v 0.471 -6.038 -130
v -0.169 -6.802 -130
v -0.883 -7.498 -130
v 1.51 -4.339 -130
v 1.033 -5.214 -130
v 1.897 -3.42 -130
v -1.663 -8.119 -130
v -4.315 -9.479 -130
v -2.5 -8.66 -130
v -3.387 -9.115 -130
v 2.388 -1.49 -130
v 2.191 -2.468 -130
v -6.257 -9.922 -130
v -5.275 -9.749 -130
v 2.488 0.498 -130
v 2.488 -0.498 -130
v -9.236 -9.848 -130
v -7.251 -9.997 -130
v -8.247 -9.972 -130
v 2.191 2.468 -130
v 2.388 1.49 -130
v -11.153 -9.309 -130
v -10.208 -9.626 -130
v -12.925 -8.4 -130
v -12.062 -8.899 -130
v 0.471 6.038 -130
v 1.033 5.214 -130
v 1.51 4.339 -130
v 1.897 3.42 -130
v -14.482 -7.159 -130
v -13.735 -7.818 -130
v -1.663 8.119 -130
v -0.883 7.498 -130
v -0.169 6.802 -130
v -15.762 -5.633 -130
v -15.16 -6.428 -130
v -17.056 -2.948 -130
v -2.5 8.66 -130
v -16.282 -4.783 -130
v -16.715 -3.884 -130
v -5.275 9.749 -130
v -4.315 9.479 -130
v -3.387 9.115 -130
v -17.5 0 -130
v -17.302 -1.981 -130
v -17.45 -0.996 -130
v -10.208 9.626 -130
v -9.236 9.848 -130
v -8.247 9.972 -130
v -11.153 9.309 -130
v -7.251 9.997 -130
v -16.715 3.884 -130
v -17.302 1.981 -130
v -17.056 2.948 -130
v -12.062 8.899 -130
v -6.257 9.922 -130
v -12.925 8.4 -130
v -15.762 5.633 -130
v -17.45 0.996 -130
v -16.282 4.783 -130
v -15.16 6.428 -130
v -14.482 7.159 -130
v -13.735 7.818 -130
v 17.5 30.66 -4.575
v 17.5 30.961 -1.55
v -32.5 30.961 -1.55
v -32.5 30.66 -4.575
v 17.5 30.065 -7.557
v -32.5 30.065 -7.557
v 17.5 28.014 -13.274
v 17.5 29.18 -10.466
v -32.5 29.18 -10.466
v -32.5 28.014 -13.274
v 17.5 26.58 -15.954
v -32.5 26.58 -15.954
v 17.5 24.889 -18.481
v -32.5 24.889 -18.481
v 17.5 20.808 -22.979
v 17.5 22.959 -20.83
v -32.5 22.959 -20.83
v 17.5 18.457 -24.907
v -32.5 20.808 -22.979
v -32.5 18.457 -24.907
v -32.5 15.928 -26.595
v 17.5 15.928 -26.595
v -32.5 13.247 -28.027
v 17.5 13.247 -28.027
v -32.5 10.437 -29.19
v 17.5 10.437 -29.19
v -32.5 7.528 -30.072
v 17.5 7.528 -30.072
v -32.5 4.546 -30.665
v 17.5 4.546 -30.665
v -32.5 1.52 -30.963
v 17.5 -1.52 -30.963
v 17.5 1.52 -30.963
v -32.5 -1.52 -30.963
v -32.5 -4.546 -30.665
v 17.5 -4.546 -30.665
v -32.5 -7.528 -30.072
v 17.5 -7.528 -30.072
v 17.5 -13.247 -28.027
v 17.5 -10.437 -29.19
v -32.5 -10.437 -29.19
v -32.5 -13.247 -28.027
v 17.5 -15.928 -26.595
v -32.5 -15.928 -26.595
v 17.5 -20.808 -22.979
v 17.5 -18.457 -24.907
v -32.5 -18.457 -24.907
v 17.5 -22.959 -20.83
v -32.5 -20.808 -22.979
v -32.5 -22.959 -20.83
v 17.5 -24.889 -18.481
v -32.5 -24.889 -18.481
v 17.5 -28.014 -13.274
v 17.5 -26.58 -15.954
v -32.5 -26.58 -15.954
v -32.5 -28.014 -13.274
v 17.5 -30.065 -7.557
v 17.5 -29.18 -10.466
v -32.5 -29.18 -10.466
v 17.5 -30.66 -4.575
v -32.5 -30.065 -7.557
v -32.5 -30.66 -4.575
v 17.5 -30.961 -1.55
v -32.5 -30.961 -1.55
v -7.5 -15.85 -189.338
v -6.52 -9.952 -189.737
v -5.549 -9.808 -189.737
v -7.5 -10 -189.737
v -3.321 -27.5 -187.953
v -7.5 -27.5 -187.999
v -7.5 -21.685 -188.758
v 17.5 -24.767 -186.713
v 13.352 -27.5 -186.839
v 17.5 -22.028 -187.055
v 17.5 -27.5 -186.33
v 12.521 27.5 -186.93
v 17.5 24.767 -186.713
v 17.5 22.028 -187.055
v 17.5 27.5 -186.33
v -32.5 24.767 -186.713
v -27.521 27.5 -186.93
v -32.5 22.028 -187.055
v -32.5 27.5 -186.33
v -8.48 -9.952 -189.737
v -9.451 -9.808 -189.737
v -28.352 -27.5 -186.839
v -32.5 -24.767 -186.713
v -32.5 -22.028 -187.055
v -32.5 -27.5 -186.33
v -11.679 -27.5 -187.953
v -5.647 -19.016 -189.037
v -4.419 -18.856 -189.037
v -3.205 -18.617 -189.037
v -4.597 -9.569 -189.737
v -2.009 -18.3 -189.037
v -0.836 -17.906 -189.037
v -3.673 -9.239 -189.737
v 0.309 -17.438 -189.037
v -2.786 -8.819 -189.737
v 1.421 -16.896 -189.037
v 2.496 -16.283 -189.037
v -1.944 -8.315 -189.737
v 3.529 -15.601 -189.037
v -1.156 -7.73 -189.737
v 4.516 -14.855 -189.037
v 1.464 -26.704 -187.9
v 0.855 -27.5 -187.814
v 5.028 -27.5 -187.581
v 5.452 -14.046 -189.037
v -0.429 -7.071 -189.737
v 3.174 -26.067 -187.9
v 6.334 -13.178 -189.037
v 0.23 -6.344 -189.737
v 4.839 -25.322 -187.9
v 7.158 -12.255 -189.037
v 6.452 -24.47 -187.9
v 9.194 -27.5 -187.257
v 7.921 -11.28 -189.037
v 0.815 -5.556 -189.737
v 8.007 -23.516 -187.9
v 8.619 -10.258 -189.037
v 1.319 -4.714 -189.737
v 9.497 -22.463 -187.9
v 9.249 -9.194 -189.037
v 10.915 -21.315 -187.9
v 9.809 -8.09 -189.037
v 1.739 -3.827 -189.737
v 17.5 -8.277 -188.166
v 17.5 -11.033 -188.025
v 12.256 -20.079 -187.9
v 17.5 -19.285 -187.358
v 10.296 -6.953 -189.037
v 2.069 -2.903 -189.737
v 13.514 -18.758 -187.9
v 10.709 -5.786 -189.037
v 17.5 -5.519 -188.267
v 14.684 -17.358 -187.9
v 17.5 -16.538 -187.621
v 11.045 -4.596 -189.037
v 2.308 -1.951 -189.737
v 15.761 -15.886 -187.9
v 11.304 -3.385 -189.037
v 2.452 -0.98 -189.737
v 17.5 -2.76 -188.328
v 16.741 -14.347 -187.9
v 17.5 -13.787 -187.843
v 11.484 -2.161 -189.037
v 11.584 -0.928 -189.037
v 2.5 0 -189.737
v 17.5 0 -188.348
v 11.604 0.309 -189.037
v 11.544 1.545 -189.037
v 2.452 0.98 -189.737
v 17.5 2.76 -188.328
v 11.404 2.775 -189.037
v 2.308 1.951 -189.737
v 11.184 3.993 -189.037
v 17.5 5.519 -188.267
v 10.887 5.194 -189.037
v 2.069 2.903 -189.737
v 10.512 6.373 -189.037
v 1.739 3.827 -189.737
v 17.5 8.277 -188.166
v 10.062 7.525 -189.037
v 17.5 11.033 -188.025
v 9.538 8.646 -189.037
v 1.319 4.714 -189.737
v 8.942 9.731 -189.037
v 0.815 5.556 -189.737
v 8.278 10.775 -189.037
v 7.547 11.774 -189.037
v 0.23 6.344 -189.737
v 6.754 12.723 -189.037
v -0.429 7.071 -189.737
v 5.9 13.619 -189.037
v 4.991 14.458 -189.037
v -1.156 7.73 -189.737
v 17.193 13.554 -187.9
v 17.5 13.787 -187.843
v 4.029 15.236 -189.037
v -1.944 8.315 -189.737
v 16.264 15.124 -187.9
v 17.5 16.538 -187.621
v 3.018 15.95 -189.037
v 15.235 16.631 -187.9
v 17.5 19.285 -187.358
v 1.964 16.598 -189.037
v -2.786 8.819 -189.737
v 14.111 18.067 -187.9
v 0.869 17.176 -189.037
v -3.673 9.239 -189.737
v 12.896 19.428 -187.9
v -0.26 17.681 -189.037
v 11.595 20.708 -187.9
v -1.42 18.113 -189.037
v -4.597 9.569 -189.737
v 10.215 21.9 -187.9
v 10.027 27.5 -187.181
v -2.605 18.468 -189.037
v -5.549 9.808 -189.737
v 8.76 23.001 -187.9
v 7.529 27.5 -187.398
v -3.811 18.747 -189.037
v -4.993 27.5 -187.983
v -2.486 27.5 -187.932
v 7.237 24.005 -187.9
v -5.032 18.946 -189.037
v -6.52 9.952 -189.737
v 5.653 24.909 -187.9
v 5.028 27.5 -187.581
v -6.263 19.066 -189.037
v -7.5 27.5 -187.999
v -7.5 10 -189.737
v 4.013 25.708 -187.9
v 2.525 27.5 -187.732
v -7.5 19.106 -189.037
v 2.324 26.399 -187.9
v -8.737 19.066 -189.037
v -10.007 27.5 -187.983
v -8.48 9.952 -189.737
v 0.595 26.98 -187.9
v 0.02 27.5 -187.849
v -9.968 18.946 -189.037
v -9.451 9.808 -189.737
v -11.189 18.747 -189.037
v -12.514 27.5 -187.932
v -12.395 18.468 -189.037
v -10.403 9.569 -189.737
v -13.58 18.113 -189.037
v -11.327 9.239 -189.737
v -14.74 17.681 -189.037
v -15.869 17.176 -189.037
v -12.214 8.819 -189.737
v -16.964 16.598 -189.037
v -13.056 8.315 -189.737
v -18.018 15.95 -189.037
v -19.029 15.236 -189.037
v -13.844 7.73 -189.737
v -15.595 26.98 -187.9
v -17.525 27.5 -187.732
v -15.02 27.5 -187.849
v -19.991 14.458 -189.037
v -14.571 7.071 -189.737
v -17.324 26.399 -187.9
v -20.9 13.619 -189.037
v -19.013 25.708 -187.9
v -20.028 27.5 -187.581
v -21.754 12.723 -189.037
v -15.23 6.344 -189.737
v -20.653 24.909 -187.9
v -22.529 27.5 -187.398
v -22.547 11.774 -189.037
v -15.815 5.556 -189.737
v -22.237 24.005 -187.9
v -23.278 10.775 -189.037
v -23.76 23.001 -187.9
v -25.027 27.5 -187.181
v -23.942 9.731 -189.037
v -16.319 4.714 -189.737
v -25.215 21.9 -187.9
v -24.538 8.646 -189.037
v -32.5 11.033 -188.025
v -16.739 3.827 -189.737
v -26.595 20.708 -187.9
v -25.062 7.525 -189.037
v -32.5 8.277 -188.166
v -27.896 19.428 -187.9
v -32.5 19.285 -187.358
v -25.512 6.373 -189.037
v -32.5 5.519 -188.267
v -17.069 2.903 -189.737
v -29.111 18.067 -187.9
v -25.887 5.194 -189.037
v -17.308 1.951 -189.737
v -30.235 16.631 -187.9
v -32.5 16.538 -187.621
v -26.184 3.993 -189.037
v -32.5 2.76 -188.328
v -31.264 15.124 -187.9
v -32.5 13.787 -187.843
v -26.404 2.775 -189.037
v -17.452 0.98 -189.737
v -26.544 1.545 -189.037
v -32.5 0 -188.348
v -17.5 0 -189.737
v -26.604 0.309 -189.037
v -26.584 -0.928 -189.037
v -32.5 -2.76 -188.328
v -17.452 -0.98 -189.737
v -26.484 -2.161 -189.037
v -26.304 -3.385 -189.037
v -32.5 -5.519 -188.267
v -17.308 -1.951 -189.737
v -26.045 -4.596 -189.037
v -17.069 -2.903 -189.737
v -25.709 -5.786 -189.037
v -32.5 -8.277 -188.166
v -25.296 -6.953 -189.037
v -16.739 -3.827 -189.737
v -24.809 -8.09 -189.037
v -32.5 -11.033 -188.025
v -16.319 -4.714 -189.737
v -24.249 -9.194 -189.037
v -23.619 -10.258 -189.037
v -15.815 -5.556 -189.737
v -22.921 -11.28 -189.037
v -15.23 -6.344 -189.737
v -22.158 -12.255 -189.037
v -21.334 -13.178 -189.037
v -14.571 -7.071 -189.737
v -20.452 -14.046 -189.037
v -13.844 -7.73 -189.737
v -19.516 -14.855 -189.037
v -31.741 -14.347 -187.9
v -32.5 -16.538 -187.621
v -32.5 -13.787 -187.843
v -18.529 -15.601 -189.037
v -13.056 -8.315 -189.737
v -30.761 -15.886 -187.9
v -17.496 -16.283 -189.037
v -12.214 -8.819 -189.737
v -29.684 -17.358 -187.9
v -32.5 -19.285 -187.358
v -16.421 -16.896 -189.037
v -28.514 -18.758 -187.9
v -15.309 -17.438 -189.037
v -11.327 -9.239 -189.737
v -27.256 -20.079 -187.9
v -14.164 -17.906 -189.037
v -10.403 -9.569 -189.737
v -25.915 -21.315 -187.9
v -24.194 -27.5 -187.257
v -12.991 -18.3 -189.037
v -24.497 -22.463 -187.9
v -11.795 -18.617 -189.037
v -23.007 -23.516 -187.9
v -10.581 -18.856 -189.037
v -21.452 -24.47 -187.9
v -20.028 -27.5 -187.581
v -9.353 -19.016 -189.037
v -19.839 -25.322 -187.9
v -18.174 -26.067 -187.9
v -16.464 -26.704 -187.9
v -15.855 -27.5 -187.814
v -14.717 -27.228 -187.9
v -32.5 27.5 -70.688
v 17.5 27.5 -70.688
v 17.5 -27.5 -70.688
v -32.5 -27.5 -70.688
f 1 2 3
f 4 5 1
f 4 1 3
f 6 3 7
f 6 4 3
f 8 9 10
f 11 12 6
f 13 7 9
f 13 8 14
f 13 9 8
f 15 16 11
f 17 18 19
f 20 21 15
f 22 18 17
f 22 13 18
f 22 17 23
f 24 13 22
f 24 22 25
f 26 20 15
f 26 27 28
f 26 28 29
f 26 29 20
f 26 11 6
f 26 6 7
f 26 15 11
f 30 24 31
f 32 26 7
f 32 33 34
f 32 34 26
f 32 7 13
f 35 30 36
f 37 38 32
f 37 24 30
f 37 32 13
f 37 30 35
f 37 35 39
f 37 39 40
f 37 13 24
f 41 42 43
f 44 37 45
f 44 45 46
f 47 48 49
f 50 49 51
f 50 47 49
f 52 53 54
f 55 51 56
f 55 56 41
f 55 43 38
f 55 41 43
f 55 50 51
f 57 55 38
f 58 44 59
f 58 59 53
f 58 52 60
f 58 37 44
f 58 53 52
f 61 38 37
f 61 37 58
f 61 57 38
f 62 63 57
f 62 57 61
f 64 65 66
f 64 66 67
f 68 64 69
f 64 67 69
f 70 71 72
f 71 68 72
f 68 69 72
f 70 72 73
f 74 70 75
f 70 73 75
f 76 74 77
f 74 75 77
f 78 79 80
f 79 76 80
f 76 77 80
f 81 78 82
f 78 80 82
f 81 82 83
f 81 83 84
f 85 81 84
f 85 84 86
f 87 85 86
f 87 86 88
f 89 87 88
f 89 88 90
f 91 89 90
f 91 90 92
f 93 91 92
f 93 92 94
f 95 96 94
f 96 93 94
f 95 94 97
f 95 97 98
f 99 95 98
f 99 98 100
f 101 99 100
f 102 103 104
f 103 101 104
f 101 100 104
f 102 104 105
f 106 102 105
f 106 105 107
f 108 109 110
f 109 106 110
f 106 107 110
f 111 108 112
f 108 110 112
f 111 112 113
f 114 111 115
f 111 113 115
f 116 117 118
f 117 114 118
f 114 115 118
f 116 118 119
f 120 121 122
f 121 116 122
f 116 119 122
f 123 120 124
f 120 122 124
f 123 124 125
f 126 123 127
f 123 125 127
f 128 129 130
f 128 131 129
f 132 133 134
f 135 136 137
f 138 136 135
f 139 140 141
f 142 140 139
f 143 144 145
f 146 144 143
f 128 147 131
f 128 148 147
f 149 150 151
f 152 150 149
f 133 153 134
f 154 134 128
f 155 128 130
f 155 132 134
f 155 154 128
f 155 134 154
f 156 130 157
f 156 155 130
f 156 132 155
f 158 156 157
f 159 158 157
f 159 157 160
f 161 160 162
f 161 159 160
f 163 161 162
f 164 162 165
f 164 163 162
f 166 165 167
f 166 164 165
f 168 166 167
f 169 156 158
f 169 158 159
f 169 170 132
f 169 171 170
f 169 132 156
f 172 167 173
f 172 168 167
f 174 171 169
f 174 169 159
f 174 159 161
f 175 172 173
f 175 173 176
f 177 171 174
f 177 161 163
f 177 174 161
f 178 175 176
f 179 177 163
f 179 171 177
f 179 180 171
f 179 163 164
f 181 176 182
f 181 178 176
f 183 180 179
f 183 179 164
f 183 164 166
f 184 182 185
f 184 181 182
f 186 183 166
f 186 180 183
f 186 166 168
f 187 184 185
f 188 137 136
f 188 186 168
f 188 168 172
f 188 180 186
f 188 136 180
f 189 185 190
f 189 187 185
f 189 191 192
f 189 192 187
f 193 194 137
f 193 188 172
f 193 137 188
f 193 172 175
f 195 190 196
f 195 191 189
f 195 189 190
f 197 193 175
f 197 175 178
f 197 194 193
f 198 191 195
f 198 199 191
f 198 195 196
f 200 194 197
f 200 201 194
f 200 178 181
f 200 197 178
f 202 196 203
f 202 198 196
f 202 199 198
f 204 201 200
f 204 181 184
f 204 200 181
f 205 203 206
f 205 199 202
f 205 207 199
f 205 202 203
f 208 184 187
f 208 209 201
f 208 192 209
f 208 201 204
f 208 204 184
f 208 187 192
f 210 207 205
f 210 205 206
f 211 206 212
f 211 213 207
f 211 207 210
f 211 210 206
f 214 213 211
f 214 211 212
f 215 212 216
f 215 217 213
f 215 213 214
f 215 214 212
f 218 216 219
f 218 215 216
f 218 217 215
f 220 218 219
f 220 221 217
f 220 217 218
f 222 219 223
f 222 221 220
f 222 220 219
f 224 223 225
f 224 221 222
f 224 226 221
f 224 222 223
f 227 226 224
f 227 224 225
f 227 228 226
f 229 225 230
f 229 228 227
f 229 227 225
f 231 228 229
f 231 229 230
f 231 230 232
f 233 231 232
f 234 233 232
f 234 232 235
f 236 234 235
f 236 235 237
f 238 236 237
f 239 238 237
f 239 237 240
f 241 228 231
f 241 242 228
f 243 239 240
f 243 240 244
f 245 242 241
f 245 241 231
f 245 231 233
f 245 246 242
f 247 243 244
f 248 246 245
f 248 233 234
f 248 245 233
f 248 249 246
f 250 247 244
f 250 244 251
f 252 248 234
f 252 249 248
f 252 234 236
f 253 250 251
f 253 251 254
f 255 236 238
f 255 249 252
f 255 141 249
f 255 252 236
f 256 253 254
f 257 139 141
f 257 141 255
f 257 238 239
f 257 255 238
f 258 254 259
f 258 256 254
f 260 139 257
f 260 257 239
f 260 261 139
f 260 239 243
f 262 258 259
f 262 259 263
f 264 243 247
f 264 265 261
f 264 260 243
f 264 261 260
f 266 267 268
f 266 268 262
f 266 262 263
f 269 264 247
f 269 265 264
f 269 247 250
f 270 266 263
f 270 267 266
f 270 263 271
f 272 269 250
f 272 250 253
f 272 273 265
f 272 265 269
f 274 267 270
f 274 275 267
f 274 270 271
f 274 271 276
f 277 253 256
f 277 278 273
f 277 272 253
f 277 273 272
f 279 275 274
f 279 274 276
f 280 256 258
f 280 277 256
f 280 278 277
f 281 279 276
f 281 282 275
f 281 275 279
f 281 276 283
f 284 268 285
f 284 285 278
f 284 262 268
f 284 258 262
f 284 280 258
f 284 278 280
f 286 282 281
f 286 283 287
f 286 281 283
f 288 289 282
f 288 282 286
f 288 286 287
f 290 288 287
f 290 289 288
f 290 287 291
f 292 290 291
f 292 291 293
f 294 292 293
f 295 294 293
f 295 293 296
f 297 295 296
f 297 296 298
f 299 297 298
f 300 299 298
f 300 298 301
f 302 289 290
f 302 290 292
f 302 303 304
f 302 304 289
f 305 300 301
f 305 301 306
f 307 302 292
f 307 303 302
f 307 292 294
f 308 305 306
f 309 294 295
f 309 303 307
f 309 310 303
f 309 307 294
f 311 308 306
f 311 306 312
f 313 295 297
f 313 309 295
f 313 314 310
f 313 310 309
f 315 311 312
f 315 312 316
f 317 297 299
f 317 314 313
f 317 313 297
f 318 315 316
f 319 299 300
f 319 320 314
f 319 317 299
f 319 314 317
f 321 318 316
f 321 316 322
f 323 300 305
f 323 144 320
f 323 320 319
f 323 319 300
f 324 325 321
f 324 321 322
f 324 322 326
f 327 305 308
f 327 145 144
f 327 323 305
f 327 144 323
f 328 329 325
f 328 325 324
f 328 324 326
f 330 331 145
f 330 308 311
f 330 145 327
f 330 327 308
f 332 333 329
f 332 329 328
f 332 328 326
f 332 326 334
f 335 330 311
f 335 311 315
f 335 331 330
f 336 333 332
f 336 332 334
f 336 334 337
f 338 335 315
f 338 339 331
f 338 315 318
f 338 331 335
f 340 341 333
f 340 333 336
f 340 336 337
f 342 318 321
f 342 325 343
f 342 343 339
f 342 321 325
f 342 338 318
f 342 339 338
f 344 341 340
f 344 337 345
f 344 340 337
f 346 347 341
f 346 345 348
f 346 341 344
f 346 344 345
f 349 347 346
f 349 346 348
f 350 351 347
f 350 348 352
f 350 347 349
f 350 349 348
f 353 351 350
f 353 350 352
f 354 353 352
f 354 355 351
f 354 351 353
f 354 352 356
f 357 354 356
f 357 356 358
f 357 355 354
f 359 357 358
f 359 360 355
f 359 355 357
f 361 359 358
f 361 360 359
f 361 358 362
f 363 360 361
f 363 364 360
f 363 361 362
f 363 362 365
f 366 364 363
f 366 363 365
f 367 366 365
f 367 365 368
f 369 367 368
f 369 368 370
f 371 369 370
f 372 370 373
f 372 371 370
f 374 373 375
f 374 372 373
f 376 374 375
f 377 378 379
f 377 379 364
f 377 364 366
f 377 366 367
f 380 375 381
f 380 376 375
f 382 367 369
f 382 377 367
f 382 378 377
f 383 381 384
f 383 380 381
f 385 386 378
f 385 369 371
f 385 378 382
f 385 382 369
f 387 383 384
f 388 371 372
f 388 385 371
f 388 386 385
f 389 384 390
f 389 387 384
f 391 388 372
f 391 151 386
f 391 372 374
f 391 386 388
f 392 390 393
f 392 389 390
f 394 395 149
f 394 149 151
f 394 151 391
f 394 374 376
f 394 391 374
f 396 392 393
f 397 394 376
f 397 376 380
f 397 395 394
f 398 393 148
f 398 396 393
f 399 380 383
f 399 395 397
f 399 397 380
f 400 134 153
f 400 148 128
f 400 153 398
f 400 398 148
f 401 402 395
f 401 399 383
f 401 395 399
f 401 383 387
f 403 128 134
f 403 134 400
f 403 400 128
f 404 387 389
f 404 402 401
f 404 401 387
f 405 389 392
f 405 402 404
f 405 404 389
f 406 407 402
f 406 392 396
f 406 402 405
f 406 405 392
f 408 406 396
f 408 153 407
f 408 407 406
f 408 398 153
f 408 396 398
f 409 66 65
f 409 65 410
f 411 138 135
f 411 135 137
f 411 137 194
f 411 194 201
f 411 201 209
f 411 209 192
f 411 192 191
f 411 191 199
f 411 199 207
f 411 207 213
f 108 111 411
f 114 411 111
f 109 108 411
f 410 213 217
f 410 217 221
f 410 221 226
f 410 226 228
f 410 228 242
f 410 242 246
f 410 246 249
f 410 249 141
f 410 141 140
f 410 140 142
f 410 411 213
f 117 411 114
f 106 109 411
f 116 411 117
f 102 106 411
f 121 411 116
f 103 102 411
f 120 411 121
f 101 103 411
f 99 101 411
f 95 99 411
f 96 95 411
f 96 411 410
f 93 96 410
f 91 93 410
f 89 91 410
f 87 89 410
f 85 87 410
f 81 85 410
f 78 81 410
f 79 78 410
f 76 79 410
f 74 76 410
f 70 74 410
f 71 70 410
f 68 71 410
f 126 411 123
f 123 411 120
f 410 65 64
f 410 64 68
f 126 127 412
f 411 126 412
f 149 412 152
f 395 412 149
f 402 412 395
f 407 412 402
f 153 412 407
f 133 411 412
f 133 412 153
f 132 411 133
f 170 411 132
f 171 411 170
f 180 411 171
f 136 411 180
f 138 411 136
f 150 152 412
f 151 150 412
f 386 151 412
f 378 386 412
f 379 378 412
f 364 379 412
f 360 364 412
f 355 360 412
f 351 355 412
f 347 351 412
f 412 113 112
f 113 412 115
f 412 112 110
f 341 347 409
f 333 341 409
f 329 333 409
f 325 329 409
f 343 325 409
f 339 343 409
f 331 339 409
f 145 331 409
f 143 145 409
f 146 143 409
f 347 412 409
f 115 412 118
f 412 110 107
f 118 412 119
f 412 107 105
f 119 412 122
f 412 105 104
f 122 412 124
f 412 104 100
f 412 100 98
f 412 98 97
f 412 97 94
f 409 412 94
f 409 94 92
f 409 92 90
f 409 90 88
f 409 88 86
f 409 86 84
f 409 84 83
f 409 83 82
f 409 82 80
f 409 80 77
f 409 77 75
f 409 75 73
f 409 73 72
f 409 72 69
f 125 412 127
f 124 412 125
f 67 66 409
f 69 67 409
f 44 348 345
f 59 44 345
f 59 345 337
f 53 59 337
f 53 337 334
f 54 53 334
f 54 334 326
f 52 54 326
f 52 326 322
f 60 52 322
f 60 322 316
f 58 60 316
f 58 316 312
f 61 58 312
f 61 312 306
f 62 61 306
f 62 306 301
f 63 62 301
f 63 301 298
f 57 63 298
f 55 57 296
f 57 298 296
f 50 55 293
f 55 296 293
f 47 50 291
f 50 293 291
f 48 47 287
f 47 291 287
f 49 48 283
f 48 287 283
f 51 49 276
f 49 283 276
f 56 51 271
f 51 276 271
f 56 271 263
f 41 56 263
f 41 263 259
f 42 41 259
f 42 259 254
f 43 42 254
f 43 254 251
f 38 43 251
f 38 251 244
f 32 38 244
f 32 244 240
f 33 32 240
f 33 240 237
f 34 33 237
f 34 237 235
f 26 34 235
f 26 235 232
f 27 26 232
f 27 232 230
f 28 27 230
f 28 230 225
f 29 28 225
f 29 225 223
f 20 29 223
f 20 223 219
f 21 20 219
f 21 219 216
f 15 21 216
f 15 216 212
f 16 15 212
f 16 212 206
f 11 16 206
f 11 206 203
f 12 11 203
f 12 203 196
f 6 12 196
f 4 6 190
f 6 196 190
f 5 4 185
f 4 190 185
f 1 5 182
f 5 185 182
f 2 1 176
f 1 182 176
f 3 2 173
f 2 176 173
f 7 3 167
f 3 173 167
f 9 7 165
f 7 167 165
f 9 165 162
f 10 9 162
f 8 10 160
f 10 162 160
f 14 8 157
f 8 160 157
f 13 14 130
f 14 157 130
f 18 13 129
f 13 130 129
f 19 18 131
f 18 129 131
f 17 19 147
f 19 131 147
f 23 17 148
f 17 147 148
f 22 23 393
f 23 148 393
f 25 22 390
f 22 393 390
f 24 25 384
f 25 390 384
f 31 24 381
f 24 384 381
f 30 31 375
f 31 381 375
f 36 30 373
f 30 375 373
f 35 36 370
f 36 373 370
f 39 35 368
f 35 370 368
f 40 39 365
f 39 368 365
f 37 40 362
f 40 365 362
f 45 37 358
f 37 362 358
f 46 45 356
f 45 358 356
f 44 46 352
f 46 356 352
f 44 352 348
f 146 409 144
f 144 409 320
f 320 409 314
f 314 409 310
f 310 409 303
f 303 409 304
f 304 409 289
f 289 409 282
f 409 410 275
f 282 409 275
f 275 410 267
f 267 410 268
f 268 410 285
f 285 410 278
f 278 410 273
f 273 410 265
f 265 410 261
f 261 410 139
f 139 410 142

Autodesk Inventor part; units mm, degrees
ref_plane "YZ Plane" through (0, 0, 0) normal (1, 0, 0) x (0, 1, 0)
ref_plane "XY Plane" through (0, 0, 0) normal (0, 0, 1) x (1, 0, 0)
ref_plane "UCS1: YZ Plane" through (0, 0, 0) normal (1, 0, 0) x (0, 1, 0)
sketch "Sketch2" plane through (0, 0, 0) normal (1, 0, 0) x (0, 1, 0)
  circle A0 centre (0, -70) radius 27.5
  line L0 (27.5, -190) -> (-27.5, -190)
  line L1 (0, -70) -> (0, -190) construction
  line L2 (-27.5, -70) -> (-27.5, -190)
  line L3 (27.5, -70) -> (27.5, -190)
  circle A1 centre (0, 0) radius 31
  line L4 (-30.9612, -1.55) -> (-27.4656, -71.375)
  line L5 (30.9612, -1.55) -> (27.4656, -71.375)
  line L6 (31.0388, 0) -> (-31.0388, 0)
  point P0 (-31, 0)
  point P1 (31, 0)
  point P2 (-31, 0)
  point P3 (-27.5, -70.6879)
  point P4 (27.5, -70.6879)
  dimension "d1" = 55
  dimension "d3" = 55
  dimension "d25" = 120
  dimension "d26" = 62
  dimension "d33" = 70
extrude "Extrusion1" add sketch "Sketch2" along normal blind 17.5 and the other way blind 32.5 contours A0
extrude "Extrusion2" add sketch "Sketch2" against normal blind 50 from surface at 17.5 contours L3 L5 A0 | A0 L4 L2 | L5 L3 L0 L2 L4 A0
sketch "Sketch5" plane through (17.5, -27.5, -190) normal (0, 0, -1) x (-1, 0, 0)
  circle A0 centre (25, 27.5) radius 10
  line L0 (50, 55) -> (50, 0) projected
  line L1 (0, 55) -> (50, 55) projected
  point P0 (17.5, 27.5)
  point P1 (50, 27.5)
  point P2 (-45, 0)
  point P3 (25, 55)
  dimension "d22" = 20
extrude "Extrusion4" cut sketch "Sketch5" against normal blind 60
ref_plane "Work Plane1" through (-7.5, 0, -70) normal (-1, 0, 0) x (0, 0, -1)
sketch "Sketch4" plane through (-7.5, 0, -70) normal (-1, 0, 0) x (0, 0, -1)
  circle A0 centre (-70, 0) radius 190
  line L0 (120, -27.5) -> (120, 27.5) projected
  line L1 (-260, 0) -> (120, 0)
  line L2 (120, 0) -> (120, 27.5)
  line L3 (120, 27.5) -> (0, 27.5) projected
  line L4 (120, 27.5) -> (120, 47.2424)
  line L5 (120, 47.2424) -> (114.033, 47.2424)
  point P0 (-70, 0)
  point P1 (117.9993, 27.5)
  point P2 (120, 0)
revolve "Revolution1" cut sketch "Sketch4" angle 360 about axis through (-7.5, 0, 190) along (0, 0, -1) contours L5 L4 L3 A0 | L3 L0 A0
extrude "Extrusion5" add sketch "Sketch2" along normal blind 17.5 and the other way blind 32.5 contours A0 L2 L4 A1 L5 L3
properties part number "shank_inventor"
